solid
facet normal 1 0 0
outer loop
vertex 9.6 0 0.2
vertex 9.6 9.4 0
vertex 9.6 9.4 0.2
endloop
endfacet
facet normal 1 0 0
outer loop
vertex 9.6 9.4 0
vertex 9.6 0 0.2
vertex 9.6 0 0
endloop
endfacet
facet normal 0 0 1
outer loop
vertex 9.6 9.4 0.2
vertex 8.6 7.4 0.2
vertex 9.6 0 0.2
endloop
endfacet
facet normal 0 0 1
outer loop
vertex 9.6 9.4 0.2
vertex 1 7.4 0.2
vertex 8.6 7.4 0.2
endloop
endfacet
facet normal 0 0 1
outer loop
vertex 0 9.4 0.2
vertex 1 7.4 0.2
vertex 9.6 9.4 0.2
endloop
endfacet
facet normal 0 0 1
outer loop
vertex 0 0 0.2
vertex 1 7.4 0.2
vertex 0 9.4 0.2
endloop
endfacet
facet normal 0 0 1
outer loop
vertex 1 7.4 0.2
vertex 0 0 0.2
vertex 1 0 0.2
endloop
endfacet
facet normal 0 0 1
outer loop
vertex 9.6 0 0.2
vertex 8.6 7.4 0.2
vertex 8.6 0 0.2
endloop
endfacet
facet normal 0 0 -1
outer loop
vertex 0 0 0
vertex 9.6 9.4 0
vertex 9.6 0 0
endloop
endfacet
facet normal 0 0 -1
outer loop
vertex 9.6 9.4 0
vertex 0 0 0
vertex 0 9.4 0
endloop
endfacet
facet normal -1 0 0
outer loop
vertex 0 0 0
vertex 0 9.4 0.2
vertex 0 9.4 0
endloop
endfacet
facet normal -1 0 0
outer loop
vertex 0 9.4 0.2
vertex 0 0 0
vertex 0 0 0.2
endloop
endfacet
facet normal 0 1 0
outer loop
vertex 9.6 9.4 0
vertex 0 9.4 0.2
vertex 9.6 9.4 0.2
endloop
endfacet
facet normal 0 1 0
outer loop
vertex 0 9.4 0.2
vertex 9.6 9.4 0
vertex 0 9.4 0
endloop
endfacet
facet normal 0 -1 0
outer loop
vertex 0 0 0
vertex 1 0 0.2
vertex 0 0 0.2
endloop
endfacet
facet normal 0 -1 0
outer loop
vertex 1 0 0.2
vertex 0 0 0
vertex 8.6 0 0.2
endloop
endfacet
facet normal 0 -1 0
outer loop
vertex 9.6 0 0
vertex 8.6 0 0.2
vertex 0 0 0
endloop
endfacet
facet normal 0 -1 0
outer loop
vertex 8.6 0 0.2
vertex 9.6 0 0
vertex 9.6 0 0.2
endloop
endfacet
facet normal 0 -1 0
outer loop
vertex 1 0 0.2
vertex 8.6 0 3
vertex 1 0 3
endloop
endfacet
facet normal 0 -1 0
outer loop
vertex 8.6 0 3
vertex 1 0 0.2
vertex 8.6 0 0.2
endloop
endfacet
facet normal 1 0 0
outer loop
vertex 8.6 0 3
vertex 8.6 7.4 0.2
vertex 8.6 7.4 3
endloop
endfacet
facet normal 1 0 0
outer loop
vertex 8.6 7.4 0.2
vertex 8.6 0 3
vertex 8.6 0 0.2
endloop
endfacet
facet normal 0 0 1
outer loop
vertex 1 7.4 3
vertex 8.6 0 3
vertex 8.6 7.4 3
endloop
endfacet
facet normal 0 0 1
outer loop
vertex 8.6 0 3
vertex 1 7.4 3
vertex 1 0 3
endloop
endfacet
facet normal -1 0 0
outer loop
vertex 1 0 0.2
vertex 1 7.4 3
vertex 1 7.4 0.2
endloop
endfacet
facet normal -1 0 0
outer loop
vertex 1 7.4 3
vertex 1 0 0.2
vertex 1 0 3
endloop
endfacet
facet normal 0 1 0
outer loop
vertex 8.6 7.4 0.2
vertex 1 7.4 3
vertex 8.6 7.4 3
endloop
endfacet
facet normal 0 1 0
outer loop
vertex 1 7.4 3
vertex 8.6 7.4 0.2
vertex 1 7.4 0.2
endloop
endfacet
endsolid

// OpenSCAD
w=7.6;
h=7.4;
alt=3;

cube([w+2,h+2,0.2]);
translate([1,0,0])
cube([w,h,alt]);

offset(r=-3) { cube(10,10,2); }


/*
// Example 3b
scale([0.85,0.96, 0.91])
  surface(file = "mrpo1801.png", center = true, invert = false);


linear_extrude(height = 15, center = false, convexity = 12) 
	import( file="mrpo1801.dxf");

*/
